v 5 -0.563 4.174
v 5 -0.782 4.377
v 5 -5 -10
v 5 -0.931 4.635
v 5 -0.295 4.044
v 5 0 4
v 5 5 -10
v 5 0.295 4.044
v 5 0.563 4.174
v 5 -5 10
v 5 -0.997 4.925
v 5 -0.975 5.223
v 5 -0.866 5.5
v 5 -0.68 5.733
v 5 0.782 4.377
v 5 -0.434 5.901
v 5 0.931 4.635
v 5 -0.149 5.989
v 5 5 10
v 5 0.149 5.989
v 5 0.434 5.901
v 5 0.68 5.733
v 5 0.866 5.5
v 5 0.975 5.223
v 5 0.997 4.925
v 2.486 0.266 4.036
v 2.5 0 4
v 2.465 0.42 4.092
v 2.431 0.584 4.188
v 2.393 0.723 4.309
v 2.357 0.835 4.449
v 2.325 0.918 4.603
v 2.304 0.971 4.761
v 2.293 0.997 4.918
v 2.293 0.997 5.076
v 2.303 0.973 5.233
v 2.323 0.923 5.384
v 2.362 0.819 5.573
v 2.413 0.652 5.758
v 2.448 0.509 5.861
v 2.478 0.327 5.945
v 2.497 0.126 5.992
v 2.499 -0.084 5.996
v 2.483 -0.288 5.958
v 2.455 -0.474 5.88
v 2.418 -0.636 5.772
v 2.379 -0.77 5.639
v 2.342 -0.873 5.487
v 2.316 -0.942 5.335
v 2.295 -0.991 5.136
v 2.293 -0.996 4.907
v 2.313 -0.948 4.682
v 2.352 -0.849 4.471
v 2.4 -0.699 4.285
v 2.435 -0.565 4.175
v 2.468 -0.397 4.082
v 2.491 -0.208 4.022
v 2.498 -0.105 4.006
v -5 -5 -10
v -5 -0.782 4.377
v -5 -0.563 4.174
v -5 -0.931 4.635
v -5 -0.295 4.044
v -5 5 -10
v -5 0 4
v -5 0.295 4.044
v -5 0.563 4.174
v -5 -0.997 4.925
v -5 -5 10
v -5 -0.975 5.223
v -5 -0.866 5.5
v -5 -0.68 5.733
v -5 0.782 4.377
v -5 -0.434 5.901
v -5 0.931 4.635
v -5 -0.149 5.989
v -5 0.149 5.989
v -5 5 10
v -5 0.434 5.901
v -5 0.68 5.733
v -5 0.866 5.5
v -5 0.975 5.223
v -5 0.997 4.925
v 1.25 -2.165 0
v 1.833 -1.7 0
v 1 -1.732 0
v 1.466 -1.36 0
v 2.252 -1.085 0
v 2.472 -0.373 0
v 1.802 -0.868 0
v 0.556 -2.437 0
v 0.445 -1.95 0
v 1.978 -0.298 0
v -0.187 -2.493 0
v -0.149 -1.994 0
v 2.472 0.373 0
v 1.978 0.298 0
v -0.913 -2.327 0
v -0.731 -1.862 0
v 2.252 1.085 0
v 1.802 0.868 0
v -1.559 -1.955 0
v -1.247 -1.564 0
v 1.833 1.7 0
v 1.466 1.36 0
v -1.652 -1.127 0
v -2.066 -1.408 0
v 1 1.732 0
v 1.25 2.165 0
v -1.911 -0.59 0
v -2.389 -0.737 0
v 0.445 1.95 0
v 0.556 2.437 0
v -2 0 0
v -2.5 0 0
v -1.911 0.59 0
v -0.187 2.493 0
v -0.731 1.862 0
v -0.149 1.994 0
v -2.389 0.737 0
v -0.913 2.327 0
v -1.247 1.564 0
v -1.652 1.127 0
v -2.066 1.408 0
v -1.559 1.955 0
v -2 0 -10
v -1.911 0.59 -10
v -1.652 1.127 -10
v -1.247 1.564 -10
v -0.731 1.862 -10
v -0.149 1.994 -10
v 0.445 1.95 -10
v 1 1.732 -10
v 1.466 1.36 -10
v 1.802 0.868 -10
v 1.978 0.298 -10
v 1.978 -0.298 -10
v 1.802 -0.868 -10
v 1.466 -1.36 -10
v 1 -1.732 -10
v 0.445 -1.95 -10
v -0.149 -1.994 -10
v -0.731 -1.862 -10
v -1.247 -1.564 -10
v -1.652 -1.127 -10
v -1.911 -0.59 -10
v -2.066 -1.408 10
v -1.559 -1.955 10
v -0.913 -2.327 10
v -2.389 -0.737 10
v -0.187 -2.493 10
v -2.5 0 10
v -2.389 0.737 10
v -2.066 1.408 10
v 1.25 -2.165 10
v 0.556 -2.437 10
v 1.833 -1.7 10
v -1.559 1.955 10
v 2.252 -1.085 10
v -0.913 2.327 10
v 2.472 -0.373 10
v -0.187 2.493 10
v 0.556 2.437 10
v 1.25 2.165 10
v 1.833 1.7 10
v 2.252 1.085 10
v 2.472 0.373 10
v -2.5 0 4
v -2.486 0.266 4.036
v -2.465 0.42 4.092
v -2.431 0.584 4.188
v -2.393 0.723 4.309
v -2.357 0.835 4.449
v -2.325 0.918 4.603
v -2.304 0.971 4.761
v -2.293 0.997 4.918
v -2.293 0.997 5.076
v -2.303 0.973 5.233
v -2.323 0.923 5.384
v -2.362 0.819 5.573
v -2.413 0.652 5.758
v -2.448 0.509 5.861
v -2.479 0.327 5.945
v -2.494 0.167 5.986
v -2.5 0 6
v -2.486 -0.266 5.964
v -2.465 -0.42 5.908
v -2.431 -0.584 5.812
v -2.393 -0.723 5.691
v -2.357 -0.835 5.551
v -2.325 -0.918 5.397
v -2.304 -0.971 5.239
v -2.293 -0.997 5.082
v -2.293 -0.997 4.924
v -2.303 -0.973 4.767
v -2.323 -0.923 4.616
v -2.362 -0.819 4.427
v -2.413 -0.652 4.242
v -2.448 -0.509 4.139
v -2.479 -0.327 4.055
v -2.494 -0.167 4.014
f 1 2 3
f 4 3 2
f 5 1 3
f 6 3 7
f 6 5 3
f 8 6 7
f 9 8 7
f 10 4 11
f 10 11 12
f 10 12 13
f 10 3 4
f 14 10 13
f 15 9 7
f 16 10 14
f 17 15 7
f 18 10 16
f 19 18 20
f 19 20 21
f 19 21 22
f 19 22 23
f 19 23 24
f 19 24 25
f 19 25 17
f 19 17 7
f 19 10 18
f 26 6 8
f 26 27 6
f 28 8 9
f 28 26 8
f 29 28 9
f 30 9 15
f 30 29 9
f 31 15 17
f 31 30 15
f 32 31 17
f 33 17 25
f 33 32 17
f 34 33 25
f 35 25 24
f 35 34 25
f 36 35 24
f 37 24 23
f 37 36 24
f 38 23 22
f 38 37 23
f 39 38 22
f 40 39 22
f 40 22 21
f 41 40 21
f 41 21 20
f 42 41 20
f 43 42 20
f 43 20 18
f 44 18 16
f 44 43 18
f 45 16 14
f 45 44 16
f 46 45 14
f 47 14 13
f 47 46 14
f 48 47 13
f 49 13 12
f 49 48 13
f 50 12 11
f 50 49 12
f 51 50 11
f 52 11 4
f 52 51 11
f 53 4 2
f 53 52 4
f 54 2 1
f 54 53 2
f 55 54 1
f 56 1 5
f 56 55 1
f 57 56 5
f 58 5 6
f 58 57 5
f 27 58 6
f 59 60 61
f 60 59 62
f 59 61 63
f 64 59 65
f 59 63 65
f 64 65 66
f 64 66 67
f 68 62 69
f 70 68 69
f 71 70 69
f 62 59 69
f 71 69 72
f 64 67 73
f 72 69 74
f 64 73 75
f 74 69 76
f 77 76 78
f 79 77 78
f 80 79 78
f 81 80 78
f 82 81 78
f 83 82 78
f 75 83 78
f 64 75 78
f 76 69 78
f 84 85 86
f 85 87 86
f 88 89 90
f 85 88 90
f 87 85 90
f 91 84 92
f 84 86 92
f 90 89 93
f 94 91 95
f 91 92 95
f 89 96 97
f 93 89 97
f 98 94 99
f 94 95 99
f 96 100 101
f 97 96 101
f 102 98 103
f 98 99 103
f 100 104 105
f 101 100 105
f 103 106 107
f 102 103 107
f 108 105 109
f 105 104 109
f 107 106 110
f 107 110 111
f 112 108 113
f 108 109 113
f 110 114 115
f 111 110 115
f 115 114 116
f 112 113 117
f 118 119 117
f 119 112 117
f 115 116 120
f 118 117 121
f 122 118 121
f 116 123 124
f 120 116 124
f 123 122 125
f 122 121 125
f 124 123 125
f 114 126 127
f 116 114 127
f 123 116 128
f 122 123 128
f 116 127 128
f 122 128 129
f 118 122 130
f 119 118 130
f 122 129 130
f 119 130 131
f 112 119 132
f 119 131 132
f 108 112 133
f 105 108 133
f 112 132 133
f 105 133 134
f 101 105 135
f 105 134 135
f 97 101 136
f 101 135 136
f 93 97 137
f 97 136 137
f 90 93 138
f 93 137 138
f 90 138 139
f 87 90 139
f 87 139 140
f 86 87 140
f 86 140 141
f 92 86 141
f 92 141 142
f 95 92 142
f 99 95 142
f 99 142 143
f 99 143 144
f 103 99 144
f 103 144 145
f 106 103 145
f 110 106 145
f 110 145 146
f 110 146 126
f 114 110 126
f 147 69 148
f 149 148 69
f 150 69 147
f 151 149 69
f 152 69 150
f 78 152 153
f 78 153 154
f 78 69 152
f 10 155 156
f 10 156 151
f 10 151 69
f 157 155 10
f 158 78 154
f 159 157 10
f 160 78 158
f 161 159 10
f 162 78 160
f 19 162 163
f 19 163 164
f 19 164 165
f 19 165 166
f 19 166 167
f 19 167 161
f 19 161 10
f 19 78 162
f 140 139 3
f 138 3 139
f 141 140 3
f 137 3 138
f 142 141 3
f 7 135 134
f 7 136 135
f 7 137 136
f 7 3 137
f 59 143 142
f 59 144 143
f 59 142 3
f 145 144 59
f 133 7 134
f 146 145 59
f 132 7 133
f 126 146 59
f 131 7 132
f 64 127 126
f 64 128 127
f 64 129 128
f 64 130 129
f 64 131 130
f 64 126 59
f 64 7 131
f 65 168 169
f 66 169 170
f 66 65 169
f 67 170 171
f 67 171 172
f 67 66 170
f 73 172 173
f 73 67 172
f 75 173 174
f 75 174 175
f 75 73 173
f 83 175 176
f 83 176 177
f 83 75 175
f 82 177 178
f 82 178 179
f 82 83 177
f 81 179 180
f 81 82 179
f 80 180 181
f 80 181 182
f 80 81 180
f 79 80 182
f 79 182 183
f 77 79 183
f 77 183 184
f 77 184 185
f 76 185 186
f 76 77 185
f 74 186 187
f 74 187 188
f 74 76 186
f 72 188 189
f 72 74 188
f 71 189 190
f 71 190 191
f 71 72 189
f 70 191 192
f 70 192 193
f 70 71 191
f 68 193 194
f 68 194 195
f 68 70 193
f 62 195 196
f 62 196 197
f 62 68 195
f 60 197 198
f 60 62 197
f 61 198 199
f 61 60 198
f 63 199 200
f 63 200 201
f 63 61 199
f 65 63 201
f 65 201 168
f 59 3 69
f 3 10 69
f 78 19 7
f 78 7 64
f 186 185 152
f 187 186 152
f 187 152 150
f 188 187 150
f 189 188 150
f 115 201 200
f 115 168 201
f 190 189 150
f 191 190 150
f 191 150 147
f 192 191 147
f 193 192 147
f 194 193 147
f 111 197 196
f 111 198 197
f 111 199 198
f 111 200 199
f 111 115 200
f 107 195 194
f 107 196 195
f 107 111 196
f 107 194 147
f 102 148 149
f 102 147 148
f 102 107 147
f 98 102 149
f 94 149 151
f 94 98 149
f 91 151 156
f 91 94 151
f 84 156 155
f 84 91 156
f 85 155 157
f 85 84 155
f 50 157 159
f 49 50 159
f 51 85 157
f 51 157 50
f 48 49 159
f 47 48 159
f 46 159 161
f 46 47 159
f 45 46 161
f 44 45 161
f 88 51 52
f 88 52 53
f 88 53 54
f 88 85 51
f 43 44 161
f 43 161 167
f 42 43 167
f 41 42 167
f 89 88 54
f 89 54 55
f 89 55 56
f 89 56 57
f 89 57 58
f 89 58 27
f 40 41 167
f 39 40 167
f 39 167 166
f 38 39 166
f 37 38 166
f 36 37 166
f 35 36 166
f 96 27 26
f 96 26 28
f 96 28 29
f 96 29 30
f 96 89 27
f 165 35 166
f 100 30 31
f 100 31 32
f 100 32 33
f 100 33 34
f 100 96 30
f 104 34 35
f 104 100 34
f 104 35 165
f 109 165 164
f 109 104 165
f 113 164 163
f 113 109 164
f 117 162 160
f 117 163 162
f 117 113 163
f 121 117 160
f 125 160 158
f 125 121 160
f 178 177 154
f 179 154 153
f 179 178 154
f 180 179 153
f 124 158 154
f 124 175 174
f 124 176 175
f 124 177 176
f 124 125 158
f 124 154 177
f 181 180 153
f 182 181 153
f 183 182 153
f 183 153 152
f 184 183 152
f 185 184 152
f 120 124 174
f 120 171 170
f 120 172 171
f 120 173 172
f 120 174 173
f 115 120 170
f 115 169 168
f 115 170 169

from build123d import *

# Parameters (mm, degrees)
SKETCH_1_W          = 10
SKETCH_1_H          = 10
EXTRUDE_1_DEPTH     = 10
SKETCH_2_R          = 2.5
EXTRUDE_2_DEPTH     = 5
SKETCH_3_R          = 1
EXTRUDE_3_DEPTH     = 5
CUT_EXTRUDE_START   = -30
SKETCH_4_R          = 2.5
CUT_EXTRUDE_1_DEPTH = 30
SKETCH_5_R          = 1
CUT_EXTRUDE_2_DEPTH = 30
SKETCH_9_W          = 10
SKETCH_9_H          = 10
EXTRUDE_5_DEPTH     = 10
SKETCH_10_R         = 2
CUT_EXTRUDE_4_DEPTH = 20


with BuildPart() as part:
    # 草图1 → 凸台-拉伸1 (new body)
    with BuildSketch(Plane.XY):
        Rectangle(SKETCH_1_W, SKETCH_1_H)
    extrude(amount=EXTRUDE_1_DEPTH)

    # 草图2 → 凸台-拉伸2 (add)
    with BuildSketch(Plane.XY.offset(10)):
        Circle(SKETCH_2_R)
    extrude(amount=EXTRUDE_2_DEPTH)

    # 草图3 → 凸台-拉伸3 (add)
    with BuildSketch(Plane(origin=(5, 0, 0), x_dir=(0, 0, -1), z_dir=(1, 0, 0))):
        with Locations(Location((-5, 0, 0), (0, 0, 270))):
            Circle(SKETCH_3_R)
    extrude(amount=EXTRUDE_3_DEPTH)

    # 草图4 → 切除-拉伸1 (cut)
    with BuildSketch(Plane.XY.offset(15).offset(CUT_EXTRUDE_START)):
        with Locations(Location((0, 0, 0), (0, 0, 180))):
            Circle(SKETCH_4_R)
    extrude(amount=CUT_EXTRUDE_1_DEPTH, mode=Mode.SUBTRACT)

    # 草图5 → 切除-拉伸2 (cut)
    with BuildSketch(Plane(origin=(10, 0, 0), x_dir=(0, 0, -1), z_dir=(1, 0, 0)).offset(CUT_EXTRUDE_START)):
        with Locations((-5, 0)):
            Circle(SKETCH_5_R)
    extrude(amount=CUT_EXTRUDE_2_DEPTH, mode=Mode.SUBTRACT)

    # 草图9 → 凸台-拉伸5 (add)
    with BuildSketch(Plane(origin=(0, 0, 0), x_dir=(-1, 0, 0), z_dir=(0, 0, -1))):
        Rectangle(SKETCH_9_W, SKETCH_9_H)
    extrude(amount=EXTRUDE_5_DEPTH)

    # 草图10 → 切除-拉伸4 (cut)
    with BuildSketch(Plane(origin=(0, 0, -10), x_dir=(-1, 0, 0), z_dir=(0, 0, -1))):
        Circle(SKETCH_10_R)
    extrude(amount=-CUT_EXTRUDE_4_DEPTH, mode=Mode.SUBTRACT)


solid = part.part
